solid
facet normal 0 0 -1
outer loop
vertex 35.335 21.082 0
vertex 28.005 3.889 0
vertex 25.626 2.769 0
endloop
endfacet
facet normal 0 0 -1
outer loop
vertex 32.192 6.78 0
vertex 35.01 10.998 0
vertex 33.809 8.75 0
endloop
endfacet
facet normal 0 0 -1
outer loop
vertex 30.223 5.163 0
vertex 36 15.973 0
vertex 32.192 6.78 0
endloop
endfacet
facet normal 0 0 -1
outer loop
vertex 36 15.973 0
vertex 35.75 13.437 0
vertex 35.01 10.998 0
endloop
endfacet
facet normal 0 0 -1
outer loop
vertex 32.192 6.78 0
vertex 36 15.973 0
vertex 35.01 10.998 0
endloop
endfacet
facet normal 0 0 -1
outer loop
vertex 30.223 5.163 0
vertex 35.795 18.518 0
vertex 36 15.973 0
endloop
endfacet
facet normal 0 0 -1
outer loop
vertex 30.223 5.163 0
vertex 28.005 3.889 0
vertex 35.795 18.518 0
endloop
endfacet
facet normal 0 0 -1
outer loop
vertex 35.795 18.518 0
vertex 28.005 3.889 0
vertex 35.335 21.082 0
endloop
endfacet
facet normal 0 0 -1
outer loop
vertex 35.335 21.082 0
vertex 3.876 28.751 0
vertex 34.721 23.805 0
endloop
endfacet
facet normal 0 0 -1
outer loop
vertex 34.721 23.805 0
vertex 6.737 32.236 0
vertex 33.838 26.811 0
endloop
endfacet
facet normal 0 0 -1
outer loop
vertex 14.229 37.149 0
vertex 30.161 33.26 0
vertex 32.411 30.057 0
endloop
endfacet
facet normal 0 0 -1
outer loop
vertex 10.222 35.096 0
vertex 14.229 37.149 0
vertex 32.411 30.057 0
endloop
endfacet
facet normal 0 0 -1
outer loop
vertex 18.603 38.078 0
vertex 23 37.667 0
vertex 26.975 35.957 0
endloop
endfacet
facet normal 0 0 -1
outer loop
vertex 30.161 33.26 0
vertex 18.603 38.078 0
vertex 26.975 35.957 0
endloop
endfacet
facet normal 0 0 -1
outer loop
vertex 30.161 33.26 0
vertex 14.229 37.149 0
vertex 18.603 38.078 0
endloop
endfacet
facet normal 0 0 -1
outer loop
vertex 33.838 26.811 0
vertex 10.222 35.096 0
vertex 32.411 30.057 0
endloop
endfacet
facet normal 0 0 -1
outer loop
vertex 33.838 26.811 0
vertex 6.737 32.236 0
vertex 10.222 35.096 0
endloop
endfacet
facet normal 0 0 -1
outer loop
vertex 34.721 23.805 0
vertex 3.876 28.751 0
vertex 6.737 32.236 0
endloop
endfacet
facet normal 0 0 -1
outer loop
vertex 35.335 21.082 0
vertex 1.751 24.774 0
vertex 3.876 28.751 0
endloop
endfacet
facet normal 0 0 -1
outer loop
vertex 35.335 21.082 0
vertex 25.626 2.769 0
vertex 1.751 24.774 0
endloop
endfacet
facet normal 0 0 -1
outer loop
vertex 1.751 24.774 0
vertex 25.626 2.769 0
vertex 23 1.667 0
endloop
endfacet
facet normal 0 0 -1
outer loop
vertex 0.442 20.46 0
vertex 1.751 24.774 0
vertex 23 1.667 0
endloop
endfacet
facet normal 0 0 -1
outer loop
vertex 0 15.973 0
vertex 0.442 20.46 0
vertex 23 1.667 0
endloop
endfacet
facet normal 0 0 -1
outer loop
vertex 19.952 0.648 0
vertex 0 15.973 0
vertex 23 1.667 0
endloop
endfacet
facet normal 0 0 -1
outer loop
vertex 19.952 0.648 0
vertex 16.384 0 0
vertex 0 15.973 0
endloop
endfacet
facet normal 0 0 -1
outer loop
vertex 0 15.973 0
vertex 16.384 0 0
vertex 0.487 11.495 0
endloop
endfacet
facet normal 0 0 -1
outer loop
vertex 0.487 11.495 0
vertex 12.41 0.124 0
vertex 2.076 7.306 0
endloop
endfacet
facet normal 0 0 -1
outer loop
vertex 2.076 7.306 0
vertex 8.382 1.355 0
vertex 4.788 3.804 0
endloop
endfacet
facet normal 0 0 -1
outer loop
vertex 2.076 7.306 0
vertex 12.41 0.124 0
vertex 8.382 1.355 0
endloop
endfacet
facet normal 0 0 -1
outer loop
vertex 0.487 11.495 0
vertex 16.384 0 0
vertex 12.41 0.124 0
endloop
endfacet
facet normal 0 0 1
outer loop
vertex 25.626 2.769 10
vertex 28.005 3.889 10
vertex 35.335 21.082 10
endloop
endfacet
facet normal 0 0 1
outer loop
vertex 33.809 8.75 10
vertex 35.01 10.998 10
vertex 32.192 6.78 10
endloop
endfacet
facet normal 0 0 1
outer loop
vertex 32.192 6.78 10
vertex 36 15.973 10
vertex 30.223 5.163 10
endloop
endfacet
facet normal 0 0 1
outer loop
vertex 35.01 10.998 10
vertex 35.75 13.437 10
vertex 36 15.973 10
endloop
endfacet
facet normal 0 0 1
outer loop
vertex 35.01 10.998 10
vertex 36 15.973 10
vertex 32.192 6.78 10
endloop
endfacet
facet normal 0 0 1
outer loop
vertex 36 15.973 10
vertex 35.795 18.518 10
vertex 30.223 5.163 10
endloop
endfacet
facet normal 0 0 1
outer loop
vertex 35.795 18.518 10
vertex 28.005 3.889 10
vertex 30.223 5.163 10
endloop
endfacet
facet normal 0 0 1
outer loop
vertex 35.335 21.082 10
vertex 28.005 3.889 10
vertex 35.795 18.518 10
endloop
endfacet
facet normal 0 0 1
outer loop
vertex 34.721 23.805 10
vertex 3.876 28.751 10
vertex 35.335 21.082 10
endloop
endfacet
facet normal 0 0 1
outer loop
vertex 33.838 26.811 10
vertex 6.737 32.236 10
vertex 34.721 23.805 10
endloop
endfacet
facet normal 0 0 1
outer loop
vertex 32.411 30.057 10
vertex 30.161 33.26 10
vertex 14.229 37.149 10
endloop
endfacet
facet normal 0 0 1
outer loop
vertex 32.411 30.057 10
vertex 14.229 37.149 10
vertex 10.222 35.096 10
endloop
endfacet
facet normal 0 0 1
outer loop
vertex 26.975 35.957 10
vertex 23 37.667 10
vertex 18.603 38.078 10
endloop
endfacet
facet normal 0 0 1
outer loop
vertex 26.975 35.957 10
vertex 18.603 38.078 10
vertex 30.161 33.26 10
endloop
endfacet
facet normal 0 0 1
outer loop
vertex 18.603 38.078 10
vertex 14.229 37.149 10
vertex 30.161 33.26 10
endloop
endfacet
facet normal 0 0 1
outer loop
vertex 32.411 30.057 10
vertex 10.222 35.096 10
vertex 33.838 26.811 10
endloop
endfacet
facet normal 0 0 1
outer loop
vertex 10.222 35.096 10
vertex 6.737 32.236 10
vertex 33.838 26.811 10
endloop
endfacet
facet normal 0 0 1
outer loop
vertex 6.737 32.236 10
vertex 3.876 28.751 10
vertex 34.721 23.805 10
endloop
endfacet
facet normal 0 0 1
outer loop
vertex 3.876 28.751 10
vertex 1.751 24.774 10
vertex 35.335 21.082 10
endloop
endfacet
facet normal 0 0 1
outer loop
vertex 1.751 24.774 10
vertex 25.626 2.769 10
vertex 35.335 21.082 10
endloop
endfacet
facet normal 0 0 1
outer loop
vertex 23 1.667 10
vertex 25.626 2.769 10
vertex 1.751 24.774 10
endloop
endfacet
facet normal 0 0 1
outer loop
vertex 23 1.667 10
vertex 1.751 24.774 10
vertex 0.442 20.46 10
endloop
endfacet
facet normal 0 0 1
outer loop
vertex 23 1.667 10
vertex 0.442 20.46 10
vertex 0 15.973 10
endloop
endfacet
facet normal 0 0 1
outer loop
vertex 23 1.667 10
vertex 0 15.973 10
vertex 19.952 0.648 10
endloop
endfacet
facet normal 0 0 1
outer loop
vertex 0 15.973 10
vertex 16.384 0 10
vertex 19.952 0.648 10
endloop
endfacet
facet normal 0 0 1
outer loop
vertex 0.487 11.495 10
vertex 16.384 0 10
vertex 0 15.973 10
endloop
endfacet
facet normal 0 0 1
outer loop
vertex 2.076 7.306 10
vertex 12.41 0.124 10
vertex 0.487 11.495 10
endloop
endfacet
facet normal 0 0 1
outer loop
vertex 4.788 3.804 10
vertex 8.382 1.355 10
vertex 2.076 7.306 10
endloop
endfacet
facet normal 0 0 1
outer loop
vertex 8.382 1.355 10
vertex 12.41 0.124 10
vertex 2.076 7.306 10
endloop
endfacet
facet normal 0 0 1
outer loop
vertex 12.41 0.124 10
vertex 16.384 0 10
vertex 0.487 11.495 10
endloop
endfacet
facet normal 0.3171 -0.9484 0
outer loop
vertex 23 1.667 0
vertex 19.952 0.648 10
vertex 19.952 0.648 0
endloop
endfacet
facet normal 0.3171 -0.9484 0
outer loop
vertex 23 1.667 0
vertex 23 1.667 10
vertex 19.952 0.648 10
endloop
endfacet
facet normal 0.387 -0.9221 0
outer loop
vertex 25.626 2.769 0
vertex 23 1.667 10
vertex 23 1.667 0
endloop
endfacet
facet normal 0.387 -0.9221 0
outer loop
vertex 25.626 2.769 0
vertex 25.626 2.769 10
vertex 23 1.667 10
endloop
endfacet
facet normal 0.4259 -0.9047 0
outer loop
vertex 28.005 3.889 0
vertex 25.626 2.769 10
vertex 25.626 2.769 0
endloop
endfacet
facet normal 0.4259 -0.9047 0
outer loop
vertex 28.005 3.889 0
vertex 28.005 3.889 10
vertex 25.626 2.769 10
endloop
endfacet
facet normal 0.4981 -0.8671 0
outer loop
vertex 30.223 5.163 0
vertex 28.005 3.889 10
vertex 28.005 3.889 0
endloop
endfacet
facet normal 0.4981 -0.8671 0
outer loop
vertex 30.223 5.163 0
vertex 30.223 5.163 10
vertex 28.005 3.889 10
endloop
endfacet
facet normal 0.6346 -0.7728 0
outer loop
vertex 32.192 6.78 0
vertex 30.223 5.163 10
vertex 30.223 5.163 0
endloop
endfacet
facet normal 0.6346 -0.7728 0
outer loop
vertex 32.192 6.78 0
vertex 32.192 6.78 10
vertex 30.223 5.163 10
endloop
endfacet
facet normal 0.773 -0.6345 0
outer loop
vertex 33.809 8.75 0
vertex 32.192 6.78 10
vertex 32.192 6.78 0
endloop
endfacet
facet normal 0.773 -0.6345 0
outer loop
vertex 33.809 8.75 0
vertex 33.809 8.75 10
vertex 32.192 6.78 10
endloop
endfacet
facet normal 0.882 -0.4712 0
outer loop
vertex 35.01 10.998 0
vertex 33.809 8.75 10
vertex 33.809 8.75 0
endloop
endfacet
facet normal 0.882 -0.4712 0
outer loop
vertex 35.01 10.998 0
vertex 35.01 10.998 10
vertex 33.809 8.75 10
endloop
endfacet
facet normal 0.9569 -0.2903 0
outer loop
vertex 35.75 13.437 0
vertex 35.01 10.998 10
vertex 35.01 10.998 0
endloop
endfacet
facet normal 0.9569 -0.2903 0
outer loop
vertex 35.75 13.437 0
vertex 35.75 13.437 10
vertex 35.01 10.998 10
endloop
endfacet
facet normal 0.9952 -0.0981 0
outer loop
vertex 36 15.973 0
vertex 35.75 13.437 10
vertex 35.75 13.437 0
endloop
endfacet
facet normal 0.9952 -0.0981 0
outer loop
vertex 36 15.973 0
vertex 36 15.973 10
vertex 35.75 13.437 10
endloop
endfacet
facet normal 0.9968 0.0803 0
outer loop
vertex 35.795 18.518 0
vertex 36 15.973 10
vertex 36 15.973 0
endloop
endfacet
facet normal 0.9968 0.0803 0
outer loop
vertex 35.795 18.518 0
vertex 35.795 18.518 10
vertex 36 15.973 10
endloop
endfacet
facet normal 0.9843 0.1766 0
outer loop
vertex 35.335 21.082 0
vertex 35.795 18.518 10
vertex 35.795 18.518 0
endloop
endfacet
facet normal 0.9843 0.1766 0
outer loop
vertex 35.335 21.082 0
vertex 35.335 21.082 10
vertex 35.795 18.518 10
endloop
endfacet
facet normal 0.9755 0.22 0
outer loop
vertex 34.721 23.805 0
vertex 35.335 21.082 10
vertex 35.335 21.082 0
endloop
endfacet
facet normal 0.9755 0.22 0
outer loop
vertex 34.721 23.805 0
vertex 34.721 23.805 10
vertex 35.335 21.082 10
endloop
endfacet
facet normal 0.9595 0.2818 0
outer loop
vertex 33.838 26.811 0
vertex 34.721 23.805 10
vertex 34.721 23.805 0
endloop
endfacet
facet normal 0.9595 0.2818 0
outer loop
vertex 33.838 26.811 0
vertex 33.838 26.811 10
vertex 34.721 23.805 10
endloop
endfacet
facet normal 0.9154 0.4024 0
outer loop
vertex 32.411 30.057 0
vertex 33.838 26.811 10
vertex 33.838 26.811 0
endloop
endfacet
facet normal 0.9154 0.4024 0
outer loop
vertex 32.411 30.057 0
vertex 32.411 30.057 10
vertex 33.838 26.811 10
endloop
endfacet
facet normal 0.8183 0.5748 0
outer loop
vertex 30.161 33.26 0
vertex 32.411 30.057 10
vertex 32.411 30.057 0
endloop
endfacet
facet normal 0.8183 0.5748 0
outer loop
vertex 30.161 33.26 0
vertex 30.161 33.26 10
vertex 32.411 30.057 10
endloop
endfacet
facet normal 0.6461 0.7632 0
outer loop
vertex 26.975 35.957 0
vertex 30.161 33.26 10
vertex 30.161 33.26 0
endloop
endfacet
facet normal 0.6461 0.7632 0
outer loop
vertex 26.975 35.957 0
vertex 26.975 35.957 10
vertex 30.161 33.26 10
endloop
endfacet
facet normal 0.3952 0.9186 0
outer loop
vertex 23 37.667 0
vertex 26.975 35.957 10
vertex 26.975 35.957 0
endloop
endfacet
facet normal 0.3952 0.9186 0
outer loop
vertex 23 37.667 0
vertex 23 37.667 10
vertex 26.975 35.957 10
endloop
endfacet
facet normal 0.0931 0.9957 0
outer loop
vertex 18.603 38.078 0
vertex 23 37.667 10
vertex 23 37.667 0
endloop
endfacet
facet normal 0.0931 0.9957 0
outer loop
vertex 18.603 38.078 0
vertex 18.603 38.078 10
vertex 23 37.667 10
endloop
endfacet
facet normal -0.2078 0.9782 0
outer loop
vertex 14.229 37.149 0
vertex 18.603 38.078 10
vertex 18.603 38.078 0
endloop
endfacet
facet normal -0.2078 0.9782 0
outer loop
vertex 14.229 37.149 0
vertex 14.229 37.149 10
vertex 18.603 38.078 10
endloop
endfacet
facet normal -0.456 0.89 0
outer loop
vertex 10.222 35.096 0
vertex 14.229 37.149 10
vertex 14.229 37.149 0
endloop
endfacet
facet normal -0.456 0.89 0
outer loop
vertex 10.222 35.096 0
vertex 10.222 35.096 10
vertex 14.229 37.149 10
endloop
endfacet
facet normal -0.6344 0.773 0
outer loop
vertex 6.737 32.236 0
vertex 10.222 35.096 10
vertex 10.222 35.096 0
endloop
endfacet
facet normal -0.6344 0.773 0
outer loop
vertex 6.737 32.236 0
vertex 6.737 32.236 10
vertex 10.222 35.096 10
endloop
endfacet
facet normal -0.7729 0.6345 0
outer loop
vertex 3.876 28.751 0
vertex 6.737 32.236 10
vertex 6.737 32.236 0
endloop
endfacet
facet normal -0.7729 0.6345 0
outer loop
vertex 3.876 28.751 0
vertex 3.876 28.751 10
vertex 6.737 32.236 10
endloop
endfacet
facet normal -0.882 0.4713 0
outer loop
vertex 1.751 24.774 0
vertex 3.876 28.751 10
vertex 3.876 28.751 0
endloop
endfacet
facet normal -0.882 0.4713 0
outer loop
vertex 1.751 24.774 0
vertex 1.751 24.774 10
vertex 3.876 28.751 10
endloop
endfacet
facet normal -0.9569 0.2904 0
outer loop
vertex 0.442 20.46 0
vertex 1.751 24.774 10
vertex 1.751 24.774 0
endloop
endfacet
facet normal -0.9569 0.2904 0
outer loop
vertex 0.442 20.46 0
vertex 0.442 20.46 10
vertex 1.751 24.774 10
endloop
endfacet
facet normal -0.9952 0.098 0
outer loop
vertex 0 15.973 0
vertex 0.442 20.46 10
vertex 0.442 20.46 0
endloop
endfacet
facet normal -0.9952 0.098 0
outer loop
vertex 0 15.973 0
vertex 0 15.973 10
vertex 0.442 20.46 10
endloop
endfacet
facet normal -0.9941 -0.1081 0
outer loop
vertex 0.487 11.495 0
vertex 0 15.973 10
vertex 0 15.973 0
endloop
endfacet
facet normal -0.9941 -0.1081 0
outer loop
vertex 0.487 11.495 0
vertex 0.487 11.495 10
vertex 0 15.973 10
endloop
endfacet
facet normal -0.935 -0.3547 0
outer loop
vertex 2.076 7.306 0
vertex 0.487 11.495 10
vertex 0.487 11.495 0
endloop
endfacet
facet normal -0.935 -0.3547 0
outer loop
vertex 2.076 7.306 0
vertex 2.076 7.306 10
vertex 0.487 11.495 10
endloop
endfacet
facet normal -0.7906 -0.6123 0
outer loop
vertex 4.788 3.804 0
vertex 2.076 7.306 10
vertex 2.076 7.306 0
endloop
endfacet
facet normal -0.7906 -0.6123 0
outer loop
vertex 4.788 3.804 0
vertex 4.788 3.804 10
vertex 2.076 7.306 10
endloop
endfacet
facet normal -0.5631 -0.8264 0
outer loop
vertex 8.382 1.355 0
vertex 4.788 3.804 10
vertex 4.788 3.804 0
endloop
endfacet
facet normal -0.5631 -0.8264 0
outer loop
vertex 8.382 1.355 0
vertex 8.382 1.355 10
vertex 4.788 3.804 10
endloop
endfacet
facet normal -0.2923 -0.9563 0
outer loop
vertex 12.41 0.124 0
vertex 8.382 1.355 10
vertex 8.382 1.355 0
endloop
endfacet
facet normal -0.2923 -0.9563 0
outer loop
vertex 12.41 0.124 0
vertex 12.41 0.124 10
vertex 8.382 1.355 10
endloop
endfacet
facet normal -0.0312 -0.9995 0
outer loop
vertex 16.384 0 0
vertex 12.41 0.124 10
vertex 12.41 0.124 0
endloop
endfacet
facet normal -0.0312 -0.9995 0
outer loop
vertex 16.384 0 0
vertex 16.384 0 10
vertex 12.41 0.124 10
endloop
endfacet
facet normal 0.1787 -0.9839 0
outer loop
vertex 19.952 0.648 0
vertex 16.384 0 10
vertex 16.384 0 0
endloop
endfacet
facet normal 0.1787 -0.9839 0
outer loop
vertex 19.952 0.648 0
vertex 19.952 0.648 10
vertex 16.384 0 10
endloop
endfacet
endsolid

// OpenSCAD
$fn = 32;

// ----------------------------------------------------------------------
// Cam disc: base radius 13.0 mm, lift 10.0 mm, 32 profile points
// ----------------------------------------------------------------------

// --- parameters (mm) ---
profile_height = 10;      // extrusion height
profile_points = 32;      // points of the closed outline

profile = [[36, 15.973], [35.795, 18.518], [35.335, 21.082], [34.721, 23.805], [33.838, 26.811], [32.411, 30.057], [30.161, 33.26], [26.975, 35.957], [23, 37.667], [18.603, 38.078], [14.229, 37.149], [10.222, 35.096], [6.737, 32.236], [3.876, 28.751], [1.751, 24.774], [0.442, 20.46], [0, 15.973], [0.487, 11.495], [2.076, 7.306], [4.788, 3.804], [8.382, 1.355], [12.41, 0.124], [16.384, 0], [19.952, 0.648], [23, 1.667], [25.626, 2.769], [28.005, 3.889], [30.223, 5.163], [32.192, 6.78], [33.809, 8.75], [35.01, 10.998], [35.75, 13.437]];  // single closed polygon, 32 points, counter clockwise

// --- the one profile operation ---
linear_extrude(height = profile_height) polygon(points = profile);
